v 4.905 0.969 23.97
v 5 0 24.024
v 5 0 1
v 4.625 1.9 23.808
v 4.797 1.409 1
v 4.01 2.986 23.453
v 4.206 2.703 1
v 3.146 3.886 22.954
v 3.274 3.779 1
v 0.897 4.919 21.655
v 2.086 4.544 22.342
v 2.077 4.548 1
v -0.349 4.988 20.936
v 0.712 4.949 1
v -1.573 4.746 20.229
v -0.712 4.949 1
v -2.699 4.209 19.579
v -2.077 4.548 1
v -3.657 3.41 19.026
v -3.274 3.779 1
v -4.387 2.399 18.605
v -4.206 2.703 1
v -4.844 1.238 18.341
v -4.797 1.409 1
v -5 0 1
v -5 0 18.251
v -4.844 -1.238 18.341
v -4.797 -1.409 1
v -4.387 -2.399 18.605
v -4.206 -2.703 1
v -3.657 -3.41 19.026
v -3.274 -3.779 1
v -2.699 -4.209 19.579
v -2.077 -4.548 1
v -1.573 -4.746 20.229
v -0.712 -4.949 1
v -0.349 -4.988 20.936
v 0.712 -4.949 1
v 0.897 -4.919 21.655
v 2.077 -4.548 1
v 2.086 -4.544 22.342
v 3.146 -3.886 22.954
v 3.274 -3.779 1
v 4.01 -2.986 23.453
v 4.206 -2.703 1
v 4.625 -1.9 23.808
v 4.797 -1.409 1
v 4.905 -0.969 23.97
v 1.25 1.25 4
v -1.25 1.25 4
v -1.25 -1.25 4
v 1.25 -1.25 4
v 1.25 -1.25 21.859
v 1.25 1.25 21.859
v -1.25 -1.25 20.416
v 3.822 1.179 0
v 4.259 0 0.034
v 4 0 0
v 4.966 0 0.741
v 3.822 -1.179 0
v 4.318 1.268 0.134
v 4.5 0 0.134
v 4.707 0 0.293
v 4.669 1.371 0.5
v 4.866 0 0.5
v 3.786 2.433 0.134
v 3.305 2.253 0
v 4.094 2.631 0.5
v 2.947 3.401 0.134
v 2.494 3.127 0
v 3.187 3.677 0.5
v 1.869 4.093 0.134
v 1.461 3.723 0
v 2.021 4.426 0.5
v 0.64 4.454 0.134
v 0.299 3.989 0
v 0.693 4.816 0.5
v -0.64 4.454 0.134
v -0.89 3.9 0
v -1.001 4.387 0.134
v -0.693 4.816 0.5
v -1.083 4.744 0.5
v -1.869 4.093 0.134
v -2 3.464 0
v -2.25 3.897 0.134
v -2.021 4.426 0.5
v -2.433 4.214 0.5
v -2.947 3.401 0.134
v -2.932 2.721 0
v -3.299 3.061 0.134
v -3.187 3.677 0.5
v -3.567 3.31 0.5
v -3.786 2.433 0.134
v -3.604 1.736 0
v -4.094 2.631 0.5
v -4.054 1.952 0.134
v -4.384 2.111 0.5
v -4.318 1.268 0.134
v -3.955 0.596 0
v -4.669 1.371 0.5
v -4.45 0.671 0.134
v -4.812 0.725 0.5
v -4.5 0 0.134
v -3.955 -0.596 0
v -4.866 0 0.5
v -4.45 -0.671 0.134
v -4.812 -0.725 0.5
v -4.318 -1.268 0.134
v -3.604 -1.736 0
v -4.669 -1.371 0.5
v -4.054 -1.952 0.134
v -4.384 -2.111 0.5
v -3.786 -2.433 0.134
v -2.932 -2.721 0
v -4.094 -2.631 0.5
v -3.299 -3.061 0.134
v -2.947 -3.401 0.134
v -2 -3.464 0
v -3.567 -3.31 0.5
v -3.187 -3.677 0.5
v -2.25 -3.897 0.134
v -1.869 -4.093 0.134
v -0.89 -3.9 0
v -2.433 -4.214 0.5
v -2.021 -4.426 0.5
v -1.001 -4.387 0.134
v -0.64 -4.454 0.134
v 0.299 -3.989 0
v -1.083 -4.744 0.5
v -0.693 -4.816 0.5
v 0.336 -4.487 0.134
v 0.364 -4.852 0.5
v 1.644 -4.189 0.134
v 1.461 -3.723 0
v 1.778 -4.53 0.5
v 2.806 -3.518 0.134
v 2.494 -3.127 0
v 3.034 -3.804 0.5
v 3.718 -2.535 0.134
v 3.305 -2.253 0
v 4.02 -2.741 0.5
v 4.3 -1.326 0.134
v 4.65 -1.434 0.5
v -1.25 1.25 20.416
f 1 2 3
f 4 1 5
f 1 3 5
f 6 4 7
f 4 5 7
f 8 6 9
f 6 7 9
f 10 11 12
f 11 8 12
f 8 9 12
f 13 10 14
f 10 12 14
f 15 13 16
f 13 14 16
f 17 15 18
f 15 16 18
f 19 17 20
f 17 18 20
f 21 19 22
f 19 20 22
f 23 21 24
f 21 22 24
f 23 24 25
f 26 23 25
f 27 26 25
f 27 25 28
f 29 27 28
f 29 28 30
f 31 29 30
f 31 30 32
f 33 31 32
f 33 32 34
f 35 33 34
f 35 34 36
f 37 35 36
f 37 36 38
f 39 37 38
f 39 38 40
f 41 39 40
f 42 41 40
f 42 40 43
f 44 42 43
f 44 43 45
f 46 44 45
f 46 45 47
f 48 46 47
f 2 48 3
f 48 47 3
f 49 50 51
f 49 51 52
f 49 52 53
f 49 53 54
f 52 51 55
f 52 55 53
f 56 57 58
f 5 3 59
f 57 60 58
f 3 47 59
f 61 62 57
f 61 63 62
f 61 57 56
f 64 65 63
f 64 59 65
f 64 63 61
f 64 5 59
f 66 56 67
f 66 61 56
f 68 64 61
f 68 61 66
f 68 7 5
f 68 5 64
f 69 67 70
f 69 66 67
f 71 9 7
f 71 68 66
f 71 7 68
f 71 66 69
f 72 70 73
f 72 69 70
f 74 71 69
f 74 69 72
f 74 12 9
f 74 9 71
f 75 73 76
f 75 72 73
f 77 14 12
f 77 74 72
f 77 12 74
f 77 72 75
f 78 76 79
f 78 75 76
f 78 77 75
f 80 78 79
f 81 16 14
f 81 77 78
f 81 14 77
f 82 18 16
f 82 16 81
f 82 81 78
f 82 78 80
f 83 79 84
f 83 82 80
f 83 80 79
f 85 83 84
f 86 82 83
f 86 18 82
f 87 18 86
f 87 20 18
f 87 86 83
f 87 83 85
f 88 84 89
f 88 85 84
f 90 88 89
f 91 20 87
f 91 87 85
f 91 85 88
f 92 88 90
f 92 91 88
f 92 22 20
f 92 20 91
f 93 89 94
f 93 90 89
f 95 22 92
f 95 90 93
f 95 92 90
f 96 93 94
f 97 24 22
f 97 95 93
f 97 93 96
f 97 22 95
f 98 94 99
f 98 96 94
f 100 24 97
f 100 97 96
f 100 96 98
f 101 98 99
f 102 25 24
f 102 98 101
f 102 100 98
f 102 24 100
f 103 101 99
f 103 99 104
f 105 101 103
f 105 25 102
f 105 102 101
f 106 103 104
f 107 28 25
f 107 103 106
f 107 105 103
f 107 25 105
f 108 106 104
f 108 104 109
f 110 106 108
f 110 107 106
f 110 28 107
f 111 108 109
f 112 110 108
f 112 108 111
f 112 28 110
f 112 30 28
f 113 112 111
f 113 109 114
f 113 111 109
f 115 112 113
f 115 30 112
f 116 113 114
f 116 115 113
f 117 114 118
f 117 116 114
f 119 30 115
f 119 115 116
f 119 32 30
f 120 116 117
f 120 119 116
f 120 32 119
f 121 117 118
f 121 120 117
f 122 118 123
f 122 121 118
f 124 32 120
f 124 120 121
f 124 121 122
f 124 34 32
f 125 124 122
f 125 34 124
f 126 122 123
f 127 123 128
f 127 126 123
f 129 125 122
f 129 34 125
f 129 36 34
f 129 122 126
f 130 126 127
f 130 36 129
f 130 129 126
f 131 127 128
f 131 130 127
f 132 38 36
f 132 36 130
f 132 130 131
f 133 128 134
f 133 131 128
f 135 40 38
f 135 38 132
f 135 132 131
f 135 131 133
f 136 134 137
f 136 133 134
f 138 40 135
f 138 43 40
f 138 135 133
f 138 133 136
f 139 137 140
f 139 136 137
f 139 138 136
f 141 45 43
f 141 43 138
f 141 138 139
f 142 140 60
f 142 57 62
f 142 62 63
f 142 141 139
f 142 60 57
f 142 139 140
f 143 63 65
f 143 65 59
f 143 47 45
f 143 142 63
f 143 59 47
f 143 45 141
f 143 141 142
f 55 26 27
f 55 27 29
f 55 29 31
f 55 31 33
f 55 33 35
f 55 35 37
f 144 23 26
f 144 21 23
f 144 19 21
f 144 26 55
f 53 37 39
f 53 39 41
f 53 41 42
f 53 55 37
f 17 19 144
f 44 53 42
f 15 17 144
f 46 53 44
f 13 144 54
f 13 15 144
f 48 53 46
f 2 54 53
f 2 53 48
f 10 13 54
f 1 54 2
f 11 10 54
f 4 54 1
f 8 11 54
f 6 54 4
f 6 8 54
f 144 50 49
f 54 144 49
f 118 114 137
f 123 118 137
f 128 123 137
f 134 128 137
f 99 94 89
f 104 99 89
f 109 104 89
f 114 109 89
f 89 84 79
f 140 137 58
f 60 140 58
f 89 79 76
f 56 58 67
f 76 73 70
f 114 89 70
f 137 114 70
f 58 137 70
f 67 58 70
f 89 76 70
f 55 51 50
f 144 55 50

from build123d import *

# Parameters (mm, degrees)
F0_R          = 5
F0_W          = 2.5
F0_H          = 2.5
F1_DEPTH      = 25
F2_DEPTH      = 4
F3_R          = 1
F5_DEPTH      = 25
F5_DEPTH_BACK = 25


with BuildPart() as f1:
    # F0 (on Top) → F1 (new body)
    with BuildSketch(Plane.XY):
        Circle(F0_R)
        Rectangle(F0_W, F0_H, mode=Mode.SUBTRACT)
    extrude(amount=F1_DEPTH)

    # F0 (on Top) → F2 (join)
    with BuildSketch(Plane.XY):
        Rectangle(F0_W, F0_H)
    extrude(amount=F2_DEPTH)

    # F3
    f3_edges = [f1.edges().sort_by_distance(p)[0] for p in [
        (-5, 0, 0),
    ]]
    fillet(f3_edges, radius=F3_R)

    # F4 (on Front) → F5 (cut, two sides)
    with BuildSketch(Plane.XZ) as f5_sk:
        Polygon((-9.264733, 30.193007), (-9.264733, 15.788589), (12.869327, 28.567694), (-3.567463, 35.245303), align=None)
    extrude(amount=F5_DEPTH, mode=Mode.SUBTRACT)
    extrude(f5_sk.sketch, amount=-F5_DEPTH_BACK, mode=Mode.SUBTRACT)


solid = f1.part
